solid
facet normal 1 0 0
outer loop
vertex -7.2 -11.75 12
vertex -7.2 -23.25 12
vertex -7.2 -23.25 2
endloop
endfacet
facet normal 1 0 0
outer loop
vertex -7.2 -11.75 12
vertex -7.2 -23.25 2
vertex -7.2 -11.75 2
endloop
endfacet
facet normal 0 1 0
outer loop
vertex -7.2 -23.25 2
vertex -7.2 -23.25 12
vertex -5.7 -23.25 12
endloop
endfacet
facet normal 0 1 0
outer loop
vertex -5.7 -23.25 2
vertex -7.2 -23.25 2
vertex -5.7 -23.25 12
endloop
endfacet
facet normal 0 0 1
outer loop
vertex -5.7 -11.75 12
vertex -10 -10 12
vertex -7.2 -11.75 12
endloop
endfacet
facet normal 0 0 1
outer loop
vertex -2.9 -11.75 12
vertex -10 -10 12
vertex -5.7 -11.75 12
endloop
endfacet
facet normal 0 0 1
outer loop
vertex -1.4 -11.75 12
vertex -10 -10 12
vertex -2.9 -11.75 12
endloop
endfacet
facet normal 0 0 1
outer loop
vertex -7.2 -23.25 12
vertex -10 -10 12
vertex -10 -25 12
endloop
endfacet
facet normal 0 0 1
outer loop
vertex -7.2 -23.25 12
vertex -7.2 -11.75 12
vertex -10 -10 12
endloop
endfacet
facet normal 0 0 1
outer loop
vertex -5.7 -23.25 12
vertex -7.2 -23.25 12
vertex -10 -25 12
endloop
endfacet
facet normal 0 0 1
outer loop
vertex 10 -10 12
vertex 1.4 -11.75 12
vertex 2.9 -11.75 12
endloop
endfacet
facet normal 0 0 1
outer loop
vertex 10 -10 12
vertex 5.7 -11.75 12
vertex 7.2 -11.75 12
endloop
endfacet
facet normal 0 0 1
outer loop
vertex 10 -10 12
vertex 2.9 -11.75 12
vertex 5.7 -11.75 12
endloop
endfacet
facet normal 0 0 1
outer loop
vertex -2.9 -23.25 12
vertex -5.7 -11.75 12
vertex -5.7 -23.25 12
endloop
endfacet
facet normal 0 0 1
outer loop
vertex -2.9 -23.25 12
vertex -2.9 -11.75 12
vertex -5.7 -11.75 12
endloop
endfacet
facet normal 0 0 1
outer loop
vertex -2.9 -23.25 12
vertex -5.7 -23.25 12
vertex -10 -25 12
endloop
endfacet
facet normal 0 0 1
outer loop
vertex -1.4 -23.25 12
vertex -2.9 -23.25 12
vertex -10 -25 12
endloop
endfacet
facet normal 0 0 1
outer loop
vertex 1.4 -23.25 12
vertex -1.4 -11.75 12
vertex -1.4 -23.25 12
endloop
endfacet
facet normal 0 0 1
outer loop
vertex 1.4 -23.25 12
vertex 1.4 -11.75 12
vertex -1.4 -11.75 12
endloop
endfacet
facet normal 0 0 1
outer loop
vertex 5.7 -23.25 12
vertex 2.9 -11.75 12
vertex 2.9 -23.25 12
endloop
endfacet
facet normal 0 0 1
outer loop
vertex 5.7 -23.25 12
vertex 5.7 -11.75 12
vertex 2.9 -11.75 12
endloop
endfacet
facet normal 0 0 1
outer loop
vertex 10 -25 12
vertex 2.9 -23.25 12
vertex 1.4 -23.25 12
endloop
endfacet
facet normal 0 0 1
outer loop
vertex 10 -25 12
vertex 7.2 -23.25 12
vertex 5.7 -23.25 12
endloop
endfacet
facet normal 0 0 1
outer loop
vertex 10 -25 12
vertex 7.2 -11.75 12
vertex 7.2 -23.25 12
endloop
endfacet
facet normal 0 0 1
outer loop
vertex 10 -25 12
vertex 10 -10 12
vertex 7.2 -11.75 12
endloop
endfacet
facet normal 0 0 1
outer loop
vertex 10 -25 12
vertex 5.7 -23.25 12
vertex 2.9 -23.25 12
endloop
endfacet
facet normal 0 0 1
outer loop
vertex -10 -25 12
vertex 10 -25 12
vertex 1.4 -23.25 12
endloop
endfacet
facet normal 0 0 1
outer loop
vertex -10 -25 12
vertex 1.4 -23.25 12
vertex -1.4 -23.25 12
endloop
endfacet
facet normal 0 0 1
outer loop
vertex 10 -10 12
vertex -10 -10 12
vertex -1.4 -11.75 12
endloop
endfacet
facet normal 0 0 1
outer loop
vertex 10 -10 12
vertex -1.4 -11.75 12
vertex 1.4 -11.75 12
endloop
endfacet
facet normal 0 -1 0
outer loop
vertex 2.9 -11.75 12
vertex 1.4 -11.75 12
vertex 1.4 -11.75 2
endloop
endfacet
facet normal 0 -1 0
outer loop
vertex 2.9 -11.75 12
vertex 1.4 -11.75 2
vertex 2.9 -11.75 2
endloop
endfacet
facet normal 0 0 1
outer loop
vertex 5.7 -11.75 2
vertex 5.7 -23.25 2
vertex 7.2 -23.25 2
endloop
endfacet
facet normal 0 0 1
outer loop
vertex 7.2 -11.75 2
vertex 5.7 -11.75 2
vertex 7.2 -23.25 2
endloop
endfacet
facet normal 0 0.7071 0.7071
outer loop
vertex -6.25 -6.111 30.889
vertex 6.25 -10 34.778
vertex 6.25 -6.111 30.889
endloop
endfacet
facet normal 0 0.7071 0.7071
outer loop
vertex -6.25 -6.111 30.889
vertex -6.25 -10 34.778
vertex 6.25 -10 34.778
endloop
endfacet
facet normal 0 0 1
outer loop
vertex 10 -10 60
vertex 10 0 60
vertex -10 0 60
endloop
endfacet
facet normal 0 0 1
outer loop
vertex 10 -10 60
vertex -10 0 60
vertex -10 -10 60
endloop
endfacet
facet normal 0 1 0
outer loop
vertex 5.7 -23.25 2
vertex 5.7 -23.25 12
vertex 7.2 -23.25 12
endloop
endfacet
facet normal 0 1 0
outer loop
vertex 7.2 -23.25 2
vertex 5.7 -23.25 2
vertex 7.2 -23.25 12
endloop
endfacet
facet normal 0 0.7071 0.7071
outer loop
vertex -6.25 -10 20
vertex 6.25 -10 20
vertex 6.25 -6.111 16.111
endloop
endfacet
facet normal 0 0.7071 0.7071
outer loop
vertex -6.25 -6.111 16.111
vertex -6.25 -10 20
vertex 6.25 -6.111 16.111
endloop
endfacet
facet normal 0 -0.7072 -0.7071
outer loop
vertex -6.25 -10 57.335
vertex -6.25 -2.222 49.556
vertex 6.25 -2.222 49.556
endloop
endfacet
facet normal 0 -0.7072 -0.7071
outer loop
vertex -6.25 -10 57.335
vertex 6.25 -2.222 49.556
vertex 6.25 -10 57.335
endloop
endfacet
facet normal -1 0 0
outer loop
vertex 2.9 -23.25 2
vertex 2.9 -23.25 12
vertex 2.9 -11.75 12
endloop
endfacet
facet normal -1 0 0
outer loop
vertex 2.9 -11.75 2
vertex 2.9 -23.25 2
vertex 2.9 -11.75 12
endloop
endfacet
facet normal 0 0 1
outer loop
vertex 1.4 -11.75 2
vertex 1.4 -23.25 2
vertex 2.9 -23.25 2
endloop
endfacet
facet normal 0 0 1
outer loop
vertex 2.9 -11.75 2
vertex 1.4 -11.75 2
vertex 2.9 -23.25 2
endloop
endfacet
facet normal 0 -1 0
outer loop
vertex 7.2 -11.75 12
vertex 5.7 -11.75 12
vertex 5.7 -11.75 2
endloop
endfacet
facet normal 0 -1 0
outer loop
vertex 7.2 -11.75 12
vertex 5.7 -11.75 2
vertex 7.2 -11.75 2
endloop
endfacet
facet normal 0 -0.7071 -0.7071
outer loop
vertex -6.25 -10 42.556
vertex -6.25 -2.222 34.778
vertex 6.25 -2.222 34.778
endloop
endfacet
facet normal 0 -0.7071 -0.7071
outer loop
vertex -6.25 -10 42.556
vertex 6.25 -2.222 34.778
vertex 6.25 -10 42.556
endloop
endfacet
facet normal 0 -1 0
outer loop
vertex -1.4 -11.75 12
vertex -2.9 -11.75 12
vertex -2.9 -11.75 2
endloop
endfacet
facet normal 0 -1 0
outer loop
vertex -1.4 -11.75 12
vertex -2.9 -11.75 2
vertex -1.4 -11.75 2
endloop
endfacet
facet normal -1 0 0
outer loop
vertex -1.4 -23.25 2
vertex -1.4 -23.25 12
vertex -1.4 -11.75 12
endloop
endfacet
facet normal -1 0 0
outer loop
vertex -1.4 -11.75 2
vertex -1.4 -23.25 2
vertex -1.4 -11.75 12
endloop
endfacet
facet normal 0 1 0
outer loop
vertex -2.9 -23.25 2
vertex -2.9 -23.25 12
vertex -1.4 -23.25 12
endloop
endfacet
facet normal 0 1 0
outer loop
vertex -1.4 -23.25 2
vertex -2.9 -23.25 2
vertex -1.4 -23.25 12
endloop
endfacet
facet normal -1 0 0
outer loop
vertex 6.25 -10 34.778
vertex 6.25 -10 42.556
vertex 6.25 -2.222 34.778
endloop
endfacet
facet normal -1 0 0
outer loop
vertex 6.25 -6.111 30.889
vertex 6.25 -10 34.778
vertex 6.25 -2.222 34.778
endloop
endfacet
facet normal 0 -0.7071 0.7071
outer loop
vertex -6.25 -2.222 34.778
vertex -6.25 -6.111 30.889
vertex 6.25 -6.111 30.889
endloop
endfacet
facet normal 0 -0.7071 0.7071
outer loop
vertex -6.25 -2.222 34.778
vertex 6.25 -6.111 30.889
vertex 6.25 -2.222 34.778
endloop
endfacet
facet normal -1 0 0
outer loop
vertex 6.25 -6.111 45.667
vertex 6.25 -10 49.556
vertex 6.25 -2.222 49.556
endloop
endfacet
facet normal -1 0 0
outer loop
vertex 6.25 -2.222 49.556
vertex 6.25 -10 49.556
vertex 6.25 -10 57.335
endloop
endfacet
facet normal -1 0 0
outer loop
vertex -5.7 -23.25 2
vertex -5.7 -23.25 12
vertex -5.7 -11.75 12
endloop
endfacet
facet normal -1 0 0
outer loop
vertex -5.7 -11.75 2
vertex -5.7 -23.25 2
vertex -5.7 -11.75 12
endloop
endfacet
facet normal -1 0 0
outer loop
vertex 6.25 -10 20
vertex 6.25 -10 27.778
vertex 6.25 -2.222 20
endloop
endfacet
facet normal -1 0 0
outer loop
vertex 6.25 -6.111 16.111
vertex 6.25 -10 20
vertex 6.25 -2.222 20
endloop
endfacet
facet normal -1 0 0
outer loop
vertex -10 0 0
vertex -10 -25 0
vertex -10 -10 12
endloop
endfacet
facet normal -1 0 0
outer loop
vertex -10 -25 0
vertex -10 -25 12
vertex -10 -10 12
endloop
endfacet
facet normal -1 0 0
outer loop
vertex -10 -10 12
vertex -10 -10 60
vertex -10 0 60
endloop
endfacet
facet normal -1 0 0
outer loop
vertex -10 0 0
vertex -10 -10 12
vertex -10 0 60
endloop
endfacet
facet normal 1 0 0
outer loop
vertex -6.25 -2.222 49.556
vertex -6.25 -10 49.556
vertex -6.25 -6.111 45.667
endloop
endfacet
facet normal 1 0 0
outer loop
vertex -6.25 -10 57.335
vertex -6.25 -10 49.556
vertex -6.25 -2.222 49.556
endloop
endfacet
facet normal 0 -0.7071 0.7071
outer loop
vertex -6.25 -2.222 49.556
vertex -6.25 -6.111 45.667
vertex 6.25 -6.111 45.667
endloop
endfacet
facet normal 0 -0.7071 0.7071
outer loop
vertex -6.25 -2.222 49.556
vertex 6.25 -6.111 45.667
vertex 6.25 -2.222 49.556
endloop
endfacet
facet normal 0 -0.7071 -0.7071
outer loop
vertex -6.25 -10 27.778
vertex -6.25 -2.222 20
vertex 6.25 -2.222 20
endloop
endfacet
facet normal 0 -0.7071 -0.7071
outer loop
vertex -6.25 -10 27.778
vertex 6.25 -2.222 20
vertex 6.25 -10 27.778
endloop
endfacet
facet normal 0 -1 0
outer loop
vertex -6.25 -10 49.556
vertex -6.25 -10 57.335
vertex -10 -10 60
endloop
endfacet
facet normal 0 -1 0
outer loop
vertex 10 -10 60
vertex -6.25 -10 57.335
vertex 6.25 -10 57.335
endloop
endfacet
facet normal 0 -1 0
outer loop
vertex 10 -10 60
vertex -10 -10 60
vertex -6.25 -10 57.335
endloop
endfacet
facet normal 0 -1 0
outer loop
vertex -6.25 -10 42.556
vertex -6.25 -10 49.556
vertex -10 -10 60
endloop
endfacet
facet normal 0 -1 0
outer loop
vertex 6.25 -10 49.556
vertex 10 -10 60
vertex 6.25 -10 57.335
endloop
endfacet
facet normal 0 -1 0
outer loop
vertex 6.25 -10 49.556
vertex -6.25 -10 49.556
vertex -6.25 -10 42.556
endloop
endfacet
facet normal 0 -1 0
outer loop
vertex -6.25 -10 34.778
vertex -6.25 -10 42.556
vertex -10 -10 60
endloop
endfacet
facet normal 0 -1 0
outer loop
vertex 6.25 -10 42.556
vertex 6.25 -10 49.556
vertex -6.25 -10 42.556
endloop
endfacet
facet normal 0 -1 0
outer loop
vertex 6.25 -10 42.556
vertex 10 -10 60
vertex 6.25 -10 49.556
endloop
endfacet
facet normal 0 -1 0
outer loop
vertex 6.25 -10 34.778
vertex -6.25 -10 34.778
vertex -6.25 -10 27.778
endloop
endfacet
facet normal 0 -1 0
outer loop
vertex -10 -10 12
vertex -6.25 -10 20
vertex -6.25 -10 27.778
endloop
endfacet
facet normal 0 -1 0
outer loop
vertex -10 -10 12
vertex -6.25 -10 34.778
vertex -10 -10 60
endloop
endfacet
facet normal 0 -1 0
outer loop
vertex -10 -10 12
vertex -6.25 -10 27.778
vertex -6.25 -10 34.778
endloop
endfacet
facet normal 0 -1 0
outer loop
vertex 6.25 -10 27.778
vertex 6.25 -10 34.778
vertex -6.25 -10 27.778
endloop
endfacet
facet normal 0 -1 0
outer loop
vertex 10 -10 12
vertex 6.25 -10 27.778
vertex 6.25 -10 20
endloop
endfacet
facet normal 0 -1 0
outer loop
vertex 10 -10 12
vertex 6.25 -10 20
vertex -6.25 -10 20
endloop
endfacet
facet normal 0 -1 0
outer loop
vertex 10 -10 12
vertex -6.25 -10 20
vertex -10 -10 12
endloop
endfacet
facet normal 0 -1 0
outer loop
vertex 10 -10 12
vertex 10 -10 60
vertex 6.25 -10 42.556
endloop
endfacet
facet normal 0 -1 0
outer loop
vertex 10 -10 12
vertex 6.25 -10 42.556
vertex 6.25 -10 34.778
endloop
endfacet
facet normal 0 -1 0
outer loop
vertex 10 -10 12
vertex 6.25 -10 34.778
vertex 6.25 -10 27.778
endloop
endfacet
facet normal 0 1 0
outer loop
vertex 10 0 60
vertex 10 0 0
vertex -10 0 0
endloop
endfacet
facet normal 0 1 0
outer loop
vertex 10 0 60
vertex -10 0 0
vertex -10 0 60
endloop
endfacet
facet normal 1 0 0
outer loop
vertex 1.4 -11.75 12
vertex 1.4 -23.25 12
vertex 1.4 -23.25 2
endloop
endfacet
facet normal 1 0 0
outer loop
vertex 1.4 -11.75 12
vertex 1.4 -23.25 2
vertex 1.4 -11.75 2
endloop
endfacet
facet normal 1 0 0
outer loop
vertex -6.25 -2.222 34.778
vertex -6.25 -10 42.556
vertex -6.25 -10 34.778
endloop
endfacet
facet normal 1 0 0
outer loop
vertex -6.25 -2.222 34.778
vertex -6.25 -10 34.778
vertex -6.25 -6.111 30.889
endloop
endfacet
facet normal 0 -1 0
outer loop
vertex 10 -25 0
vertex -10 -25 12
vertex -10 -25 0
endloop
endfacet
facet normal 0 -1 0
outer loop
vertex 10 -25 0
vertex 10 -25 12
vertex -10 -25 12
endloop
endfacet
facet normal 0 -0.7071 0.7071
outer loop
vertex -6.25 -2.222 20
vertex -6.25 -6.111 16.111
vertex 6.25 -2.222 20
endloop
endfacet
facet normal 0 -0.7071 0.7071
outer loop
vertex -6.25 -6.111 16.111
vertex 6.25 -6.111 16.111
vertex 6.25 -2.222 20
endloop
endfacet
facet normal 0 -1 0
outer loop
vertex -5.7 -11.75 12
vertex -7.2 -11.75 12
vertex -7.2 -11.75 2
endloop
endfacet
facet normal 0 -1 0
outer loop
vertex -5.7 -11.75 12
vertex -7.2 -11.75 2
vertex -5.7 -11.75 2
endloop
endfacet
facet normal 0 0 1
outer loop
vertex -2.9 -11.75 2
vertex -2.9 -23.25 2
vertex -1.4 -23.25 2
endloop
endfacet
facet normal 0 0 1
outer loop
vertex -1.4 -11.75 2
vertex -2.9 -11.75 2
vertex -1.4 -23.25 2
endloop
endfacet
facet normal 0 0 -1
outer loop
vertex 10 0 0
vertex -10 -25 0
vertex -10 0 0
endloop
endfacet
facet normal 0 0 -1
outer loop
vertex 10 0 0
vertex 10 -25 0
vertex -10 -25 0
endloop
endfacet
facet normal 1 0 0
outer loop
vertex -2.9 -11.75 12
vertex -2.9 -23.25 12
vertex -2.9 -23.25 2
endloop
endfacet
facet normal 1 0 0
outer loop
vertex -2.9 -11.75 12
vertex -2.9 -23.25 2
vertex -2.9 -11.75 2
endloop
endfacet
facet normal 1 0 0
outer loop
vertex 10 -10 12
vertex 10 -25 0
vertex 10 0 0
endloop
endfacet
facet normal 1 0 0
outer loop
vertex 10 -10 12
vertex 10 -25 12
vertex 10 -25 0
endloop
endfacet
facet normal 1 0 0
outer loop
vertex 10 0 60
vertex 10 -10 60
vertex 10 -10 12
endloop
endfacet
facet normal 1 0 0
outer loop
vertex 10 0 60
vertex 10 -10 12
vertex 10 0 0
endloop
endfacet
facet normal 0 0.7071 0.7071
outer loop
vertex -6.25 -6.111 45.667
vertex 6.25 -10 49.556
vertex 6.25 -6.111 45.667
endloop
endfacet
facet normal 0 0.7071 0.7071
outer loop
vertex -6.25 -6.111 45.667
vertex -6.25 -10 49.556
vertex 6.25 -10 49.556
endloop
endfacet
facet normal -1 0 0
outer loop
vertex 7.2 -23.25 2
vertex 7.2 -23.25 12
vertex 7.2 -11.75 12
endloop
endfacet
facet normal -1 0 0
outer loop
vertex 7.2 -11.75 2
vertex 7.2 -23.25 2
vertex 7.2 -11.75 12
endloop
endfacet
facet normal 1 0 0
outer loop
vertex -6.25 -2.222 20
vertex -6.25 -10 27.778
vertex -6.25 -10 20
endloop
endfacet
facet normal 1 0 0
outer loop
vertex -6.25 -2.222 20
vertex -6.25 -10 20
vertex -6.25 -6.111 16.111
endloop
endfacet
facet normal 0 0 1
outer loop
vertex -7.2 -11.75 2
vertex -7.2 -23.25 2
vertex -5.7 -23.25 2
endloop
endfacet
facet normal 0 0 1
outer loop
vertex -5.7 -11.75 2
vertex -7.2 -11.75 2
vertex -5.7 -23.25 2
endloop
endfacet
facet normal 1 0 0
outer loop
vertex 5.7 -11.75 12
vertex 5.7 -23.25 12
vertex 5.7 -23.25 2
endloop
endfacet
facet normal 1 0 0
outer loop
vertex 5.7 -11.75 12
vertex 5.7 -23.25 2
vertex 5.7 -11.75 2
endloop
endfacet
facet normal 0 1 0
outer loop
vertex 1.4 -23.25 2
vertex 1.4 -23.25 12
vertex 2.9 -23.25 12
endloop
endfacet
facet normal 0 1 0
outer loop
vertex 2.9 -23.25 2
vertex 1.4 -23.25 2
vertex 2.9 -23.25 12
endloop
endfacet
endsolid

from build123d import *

# Parameters (mm, degrees)
F1_DEPTH = 10
F3_DEPTH = 6.25
F4_W     = 1.5
F4_H     = 11.5
F5_DEPTH = 10


with BuildPart() as f1:
    # F0 (on Right) → F1 (new body, symmetric)
    with BuildSketch(Plane.YZ):
        Polygon((-25, 0), (0, 0), (0, 60), (-10, 60), (-10, 12), (-25, 12), align=None)
    extrude(amount=F1_DEPTH, both=True)

    # F2 (on Right) → F3 (cut, symmetric)
    with BuildSketch(Plane.YZ):
        Polygon((-2.221825, 49.556349), (-10, 57.334524), (-10, 49.556349), (-6.110913, 45.667262), align=None)
        Polygon((-2.221825, 34.778175), (-10, 42.556349), (-10, 34.778175), (-6.110913, 30.889087), align=None)
        Polygon((-2.221825, 20), (-10, 27.778175), (-10, 20), (-6.110913, 16.110913), align=None)
    extrude(amount=F3_DEPTH, both=True, mode=Mode.SUBTRACT)

    # F4 (on face) → F5 (cut)
    with BuildSketch(Plane.XY.offset(12)):
        with Locations((-6.45, -17.5)):
            Rectangle(F4_W, F4_H)
        with Locations((-2.15, -17.5)):
            Rectangle(F4_W, F4_H)
        with Locations((2.15, -17.5)):
            Rectangle(F4_W, F4_H)
        with Locations((6.45, -17.5)):
            Rectangle(F4_W, F4_H)
    extrude(amount=-F5_DEPTH, mode=Mode.SUBTRACT)


solid = f1.part
